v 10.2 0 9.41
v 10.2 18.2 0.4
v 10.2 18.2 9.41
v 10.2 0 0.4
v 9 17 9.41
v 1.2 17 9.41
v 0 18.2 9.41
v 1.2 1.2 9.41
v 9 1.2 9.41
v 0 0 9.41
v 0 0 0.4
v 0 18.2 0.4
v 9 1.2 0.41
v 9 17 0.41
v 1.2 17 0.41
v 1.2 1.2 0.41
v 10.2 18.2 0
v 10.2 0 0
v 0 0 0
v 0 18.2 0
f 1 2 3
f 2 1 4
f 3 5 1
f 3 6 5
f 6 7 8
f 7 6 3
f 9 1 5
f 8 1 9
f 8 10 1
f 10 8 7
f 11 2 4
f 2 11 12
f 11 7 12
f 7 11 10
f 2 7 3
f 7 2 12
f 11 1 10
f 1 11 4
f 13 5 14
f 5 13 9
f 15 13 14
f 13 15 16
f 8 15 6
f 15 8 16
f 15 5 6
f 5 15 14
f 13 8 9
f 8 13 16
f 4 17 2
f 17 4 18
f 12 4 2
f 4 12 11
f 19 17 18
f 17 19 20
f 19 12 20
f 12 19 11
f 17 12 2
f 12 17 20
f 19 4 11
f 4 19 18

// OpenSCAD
// file: ../../Base/Rotation.scad
// Fischertechnik Box Foundation
// Geometry Helpers Rotation

include <PlacementOptions.scad>

// getRotatedSpace(space, rotation=NoRotation)
// Rotates the space dependent on the specified rotation

function getRotatedSpace(space, rotation=NoRotation) = [
    (rotation == Rotate90 || rotation == Rotate270) ? space.y : space.x,
    (rotation == Rotate90 || rotation == Rotate270) ? space.x : space.y
];

// Rotates the given space around the fixed left lower corner
// space = the space the children needs as width/depth list [width,depth]
// rotation = 0 Rotate0 degrees, 1 Rotate90 degrees, 2 Rotate180 degrees, 3 Rotate270 degrees (equivalent to -90)

module RotateFix(space, rotation=NoRotation) {
    dy = (rotation == Rotate0 || rotation == Rotate270) ? 0 :
        (rotation == Rotate90) ? space.x :
        space.y;
    dx = (rotation < Rotate180) ? 0 :
        (rotation == Rotate180) ? space.x :
        space.y;
    
    translate([dx, dy, 0])
        rotate([0, 0, rotations[rotation]])
            children();
}
// file: ../../Base/Alignment.scad
// Fischertechnik Box Foundation
// Geometry Helpers Alignment

include <PlacementOptions.scad>

// getAlignedX(elementWidth, spaceWidth, align=AlignRight, offset=0)
// Gets the aligned X offset of an element with the given
// width in the given space.
// elementWidth = The width of the element to positon
// spaceWidth = The space where the element should be aligned
// align = 0 AlignLeft, 1 AlignCenter, 2 AlignRight
// offset = an optional offset from the aligned position. When
// aligned left or centered, then positive values are in X direction.
// When aligned right then positive values are in negative X direction.

function getAlignedX(elementWidth, spaceWidth, align=AlignRight, offset=0) =
    (align == AlignLeft) ?
        offset :
        ((align == AlignCenter) ?
        (spaceWidth - elementWidth)/2 + offset :
        spaceWidth - offset - elementWidth);

// getAlignedY(elementDepth, spaceDepth, align=AlignTop, offset=0)
// Gets the aligned Y offset of an element with the given
// depth in the given space.
// elementDepth = The depth of the element to positon
// spaceDepth = The space where the element should be aligned
// align = 0 AlignBottom, 1 AlignCenter, 2 AlignTop
// offset = an optional offset from the aligned position. When
// aligned bottom or centered, then positive values are in Y direction.
// When aligned top then positive values are in negative Y direction.

function getAlignedY(elementDepth, spaceDepth, align=AlignTop, offset=0) =
    (align == AlignBottom) ?
        offset :
        ((align == AlignCenter) ?
        (spaceDepth - elementDepth)/2 + offset :
        spaceDepth - offset - elementDepth);
// file: ../../Base/PlacementOptions.scad
// Fischertechnik Box Foundation
// Placement Options

// Alignment
NoAlign = 0;
AlignLeft = 1;
AlignBottom = 2;
AlignCenter = 3;
AlignRight = 4;
AlignTop = 5;

// Element rotation degree steps
rotations = [0, -90, -180, -270];

// Rotation
NoRotation = 0;
Rotate0 = 0;
Rotate90 = 1;
Rotate180 = 2;
Rotate270 = 3;

// Docking (seen from above)
NoDock = -1;
DockLeft = 0;
DockTop = 1;
DockRight = 2;
DockCorner = 2;
DockBottom = 3;

// Web corners
LowerLeft = 0;
UpperLeft = 1;
UpperRight = 2;
LowerRight = 3;

// Web position relative to corner
LeftOfCorner = 0;
RightOfCorner = 1;

// Rails direction
Horizontal = true;
Vertical = false;
// file: ../../Base/Boxes.scad
// Fischertechnik Box Foundation
// Pre-designed Boxes

use <Constants.scad>

include <PlacementOptions.scad>

box190Width = 190;
box190Depth = 130;
box130Width = 130;
box130Depth = 95;

// Values are from an original ec3 box
topBottomDifference = 1.5;
outerHeight = 40;
baseThickness = 1.8;
innerHeight = outerHeight - baseThickness;
stackExcess = 5.7;
radius = 3.5;
wallThickness = 1.5;
tolerance = 0.2;

boxWallThickness = wallThickness;
boxBaseThickness = baseThickness;
boxWebWidth = 3.0;

// getBoxWallThickness()
// Gets the wall thickness of a Fischertechnik Box
function getBoxWallThickness() = boxWallThickness;

// getBoxUsageHeight(height = 38.2)
// Gets the usable height of a Fischertechnik box
// height = Outer height of the box from the bottom to the upper edge.
function getBoxUsageHeight(height = outerHeight) = height - baseThickness - stackExcess;

// getBoxInnerHeight()
// Gets the inner height of a Fischertechnik box, including the stack excess
function getBoxInnerHeight() = innerHeight;

// getBoxBaseThickness()
// Gets the thickness of the Fischertechnik box base.
function getBoxBaseThickness() = boxBaseThickness;

// getBoxWebWidth()
// Gets the width of a box web
function getBoxWebWidth() = boxWebWidth;

// getBox190Space()
// Gets the usable inner space of a Box 190 as an x/y-list
function getBox190Space() = [
    box190Width - 2*getBoxWallThickness() - topBottomDifference, 
    box190Depth - 2*getBoxWallThickness() - topBottomDifference ];

// RoundedCornerPlate(width, depth, height, radius)
// Creates a body plate with rounded corners for a box. Used
// also to create the complete box with the hull module.
// width = Width of the plate
// depth = depth of the plate 
// height = thickness of the plate
// radius = radius of the rounded corner
module RoundedCornerPlate(width, depth, height, radius) {
    translate([radius, radius])
    hull() {
        w = width-2*radius;
        d = depth-2*radius;
        cube([w, d, height]);
        cylinder(height, r=radius, $fn=getFragments());
        translate([w, 0])
            cylinder(height, r=radius, $fn=getFragments());
        translate([w, d])
            cylinder(height, r=radius, $fn=getFragments());
        translate([0, d])
            cylinder(height, r=radius, $fn=getFragments());
    }
}

// BoxBase(width, depth)
// Creates an empty stackable Fischertechnik compatible box
// width = Outer width of the box (190, 130, ...)
// depth = Outer depth of the box (130, 95, ...)

module BoxBase(width, depth, height=outerHeight) {    
    thinPlate = 0.01;

    innerHeight = height - baseThickness;    
    
    module Body(tolerance=tolerance) {
        hull() {
            // Bottom with tolerance to fit into the original boxes when stacked
            translate([-wallThickness+tolerance, -wallThickness+tolerance, -baseThickness])
                RoundedCornerPlate(width-topBottomDifference-2*tolerance, depth-topBottomDifference-2*tolerance, thinPlate, radius);
            
            // Top
            translate([-wallThickness-topBottomDifference/2, -wallThickness-topBottomDifference/2, innerHeight-thinPlate])
                RoundedCornerPlate(width, depth, thinPlate, radius);
         }
    }

    module Cutoff() {
        hull() {
            coWidth = width - 2*wallThickness;
            coDepth = depth - 2*wallThickness;
            
            // Bottom
            RoundedCornerPlate(coWidth-topBottomDifference, coDepth-topBottomDifference, thinPlate, radius);

            // Top
            translate([-topBottomDifference/2, -topBottomDifference/2, innerHeight+thinPlate]) 
                RoundedCornerPlate(coWidth, coDepth, thinPlate, radius);
        }
    }
    
    difference() {        
        Body();
        Cutoff();
        stackOffset = innerHeight - stackExcess;
        translate([0, 0, stackOffset + baseThickness])
            Body(tolerance=0);
    }
}

// Creates the Fischertechnik empty box 130x190 mm and places it at position 0,0
// 190x130 are the outer sizes, the inner space is slightly smaller. Use getBox190Space() to get the inner sizes.
// The box is positioned that the usable inner space is at the 0,0,0 position.

module Box190() {
    BoxBase(box190Width, box190Depth);
}

// Gets the usable inner space of a Box 130 as an x/y-list
function getBox130Space() = [
    box130Width - 2*getBoxWallThickness() - topBottomDifference, 
    box130Depth - 2*getBoxWallThickness() - topBottomDifference ];

// Creates the Fischertechnik empty box 95x130 mm and places it at position 0,0
// 190x130 are the outer sizes, the inner space is slightly smaller. Use getBox190Space() to get the inner sizes.
// The box is positioned that the usable inner space is at the 0,0,0 position.

module Box130() {
    BoxBase(box130Width, box130Depth);
}

// Creates a web at the specified box walls
// corner 0 = LowerLeft, 1 = UpperLeft, 2 = UpperRight, 3 = LowerRight
// side 0 = LeftOfCorner, 1 = RightOfCorner
// distance = Distance in mm from the corner
// boxSpace = inner width and depth of the box (default: Box 190)
// webWidth = length of the web (default is 3 mms)
// webThickness = thickness of the web (default is 1 mm)
// height = Height of the web (standard is getBoxUsageHeight())
// sink = How much of the web is sunk into the wall

module BoxWeb(
    corner, 
    side, 
    distance, 
    boxSpace=getBox190Space(), 
    webWidth=getBoxWebWidth(), 
    webThickness=1.0, 
    height=getBoxUsageHeight(),
    sink = getBoxWallThickness()/2) {
    width = (corner % 2 == 0) ? 
            (side == LeftOfCorner ? webWidth : webThickness) :
            (side == LeftOfCorner ? webThickness : webWidth);

    depth = (corner % 2 == 0) ? 
            (side == RightOfCorner ? webWidth : webThickness) :
            (side == RightOfCorner ? webThickness : webWidth);
    
    xDiff = corner == LowerLeft ? 
                (side == LeftOfCorner ? -sink : distance) :
            (corner == UpperLeft ?                
                (side == LeftOfCorner ? distance : -sink) :
            (corner == UpperRight ?
                (side == LeftOfCorner ? boxSpace.x-webWidth+sink : boxSpace.x-distance-webThickness) :
                (side == LeftOfCorner ? boxSpace.x-distance-webThickness: boxSpace.x-webWidth+sink)));

    yDiff = corner == LowerLeft ? 
                (side == RightOfCorner ? -sink : distance) :
            (corner == UpperLeft ?
                (side == RightOfCorner ? boxSpace.y-distance-webThickness : boxSpace.y-webWidth+sink) :
            (corner == UpperRight ?
                (side == RightOfCorner ? boxSpace.y-webWidth+sink : boxSpace.y-distance-webThickness) :
                (side == RightOfCorner ? distance : -sink)));
    
    translate([xDiff, yDiff, -getExcess()])
        cube([width, depth, height + 2*getExcess()]);
}
// file: ../../Base/Placement.scad
// Fischertechnik Box Foundation
// Geometry Helpers Placement

use <Constants.scad>
use <Alignment.scad>
use <Rotation.scad>
use <Boxes.scad>

include <PlacementOptions.scad>

// Place(x=0, y=0, elementSpace=[0,0], alignX=AlignLeft, alignY=AlignBottom, rotation=Rotate0, boxSpace=getBox190Space())
// Places the child at the specified position
// y = Y-Position. This is a relative position when an X aligment is specified.
// x = X-Position. This is a relative position when an Y aligment is specified.
// elementSpace = space of the element to be placed [x,y]
// alignX = -1=NoAlign, 0 AlignLeft, 1 AlignCenter, 3 AlignRight (elementSpace and boxSpace required!)
// alignY = -1=NoAlign, 2 AlignBottom, 1 AlignCenter, 4 AlignTop (elementSpace and boxSpace required!)
// rotation = 0 Rotate0 0 degrees, 1 Rotate90 90 degrees, 
// 2 Rotate180 180 degrees, 3 Rotate270 270 degrees (equivalent to -90)
// boxSpace = Inner space of the box where the placement occurs [x,y] - default is Box 190x130 inner space

module Place(x=0, y=0, elementSpace=[0,0], 
  alignX=AlignLeft, alignY=AlignBottom, 
  rotation=NoRotation, boxSpace=getBox190Space()) {

    module Position(x, y, space, rotation=Rotate0) {
        translate([x, y, 0])
            RotateFix(space, rotation)
                children();
    }

    space = getRotatedSpace(elementSpace, rotation);
    alignedX = getAlignedX(space.x, boxSpace.x, alignX, x);
    alignedY = getAlignedY(space.y, boxSpace.y, alignY, y);
    Position(alignedX, alignedY, elementSpace, rotation)
        children();
}

// Center(space=getBox130Space(), elementSpace=[0,0])
// space = Space where the children is centered. For cylinder use centered=true and no elementSpace.
// elementSpace = space of the element to be centered [x,y]

module Center(space=getBox190Space(), elementSpace=[0,0]) {
    Place(elementSpace=elementSpace, boxSpace=space, alignX=AlignCenter, alignY=AlignCenter)
        children();
}

// CenterHorizontal(width=0, y=0, offset=0, space=getBox130Space())
// width = Width of the element to be placed.
// y = Y position of the element
// offset = Offset from the center position (negative will be left of the center)
// space = Space where the element is placed

module CenterHorizontal(width=0, y=0, offset=0, space=getBox190Space()) {
    Place(x=offset, y=y, elementSpace=[width, 0], boxSpace=space, alignX=AlignCenter)
        children(0);
}

// CenterVertical(depth=0, x=0, offset=0, space=getBox130Space())
// depth = Depth of the element to be placed.
// x = X position of the element
// offset = Offset from the center position (negative will be down of the center)
// space = Space where the element is placed

module CenterVertical(depth=0, x=0, offset=0, space=getBox190Space()) {
    Place(x=x, y=offset, elementSpace=[0, depth], boxSpace=space, alignY=AlignCenter)
        children(0);
}

// getIsVertical(align)
// True if the specified alignment needs a vertical orientation for a divider (AlignRight, AlignLeft)

function getIsVertical(align) = (align == AlignRight || align == AlignLeft);

// getIsHorizontal(align)
// True if the specified alignment needs a horizontal orientation for a divider (AlignTop, AlignBottom)

function getIsHorizontal(align) = (align == AlignTop || align == AlignBottom);
// file: ../../Elements/AxisClip10.scad
// Fischertechnik Box Library
// Axis for clip 10
// 31023

use <../ModelBase/Simple.scad>
use <../Base/Constants.scad>

/* [Element Parameters] */
height = 23;
clipHeight = 10;

/* [Hidden] */
width = 12;
depth = 12;
upperDiameter = 3.6;

// getAxisClip10Space()
// Gets the space of a n axis for a clip 10 with spring ring (mot2)

function getAxisClip10Space() = [width, depth, height];

// AxisClip10(height, clipHeight)
// Axis for clip 10 with spring ring (mot2)
// height = Height of the complete axis (standard is 23, in mot3 its only 12)
// clipHeight = Height of the part for the clip (standard is 10, in mot3 its only 7)

module AxisClip10(height=height, clipHeight=clipHeight) {
    LeveledAxisWithSpace(height, height-clipHeight, getAxisClip10Space(), diameter=upperDiameter);
}

// Test
color("lightgray")
AxisClip10(height, clipHeight);
// file: ../../Base/Constants.scad
// Fischertechnik Box Foundation
// Constants

// Constant values necessary for multiple elements

// Base constants
dividerThickness = 1.2;
excess = 0.01;
fragments = 90;
tolerance = 0.8;

// Gets the thickness of a divider 
function getDividerThickness() = dividerThickness;

// Gets the excess that is used to merge walls into each other
function getExcess() = excess;

// Gets amount of fragments of a cylinder
function getFragments() = fragments;

// Gets the inner tolerance of a frame to each side
function getTolerance() = tolerance;


// Fischertechnik specific constants
axisDiameter = 4;
axisBottomDiameter = axisDiameter + 1;
axisTolerance = 0.2;
axisLockingLength = 8;

// Gets axis diameter of Fischertechnik axis
function getAxisDiameter() = axisDiameter;

// Gets axis diameter tolerance (subtracted for element axis)
function getAxisTolerance() = axisTolerance;

// Gets the axis diameter for standing axis
function getStandAxisDiameter() = getAxisDiameter() - getAxisTolerance();

// Gets axis bottom diameter for thicker part at the bottom
function getAxisBottomDiameter() = axisBottomDiameter;

// Gets the lengthh of the locking part of a locking axis
function getAxisLockingLength() = axisLockingLength;

pinHeight = 2.5;
pinTolerance = 0.2;

// gets the height of a connecting pin
function getPinHeight() = pinHeight;

// gets the connecting pin height tolerance
function getPinTolerance() = pinTolerance;

standardEdgeDistance = 2.5;
standardWebDistance = 11.5;
standardCornerLength = 15;

// gets the standard distance to the wall of the box for dockable frames with webs
function getStandardEdgeDistance() = standardEdgeDistance;

// gets the standard distance of each web to the corner of the dockable frame
function getStandardWebDistance() = standardWebDistance;

// gets the standard length of the corner walls of a dockable frame
function getStandardCornerLength() = standardCornerLength;

tubeWallFactor = 0.8;

// gets the wall thickness of a tube.
function getTubeWallThickness() = tubeWallFactor * getDividerThickness();

smallPartsFrameHeight = 20;

// gets the frame height for docked small parts boxes.
function getSmallPartsFrameHeight() = smallPartsFrameHeight;

hubRingDiameter = 19.5;
hubRingLevelDiameter = 21;

// gets the diameter of a tube matching the inner ring of a wheel
function getHubRingDiameter() = hubRingDiameter;

// gets the diameter of a hub tube with a thicker diameter
function getHubRingLevelDiameter() = hubRingLevelDiameter;
// file: ../../Elements/FrameAngle7p5.scad
// Fischertechnik Box Library
// Frame for 7.5 degrees angle blocks
// 32071

use <../Base/Constants.scad>
use <../ModelBase/Simple.scad>

/* [Element Parameters] */
count = 1;

/* [Hidden] */
width = 7;
depth = 15;
height = 9;

// getFrameAngle7p5Space
// Gets the space the frame for 7.5 degrees angle blocks needs for count blocks
// count = Count of angle blocks

function getFrameAngle7p5Space(count=1) = getFrameOuterVolume([width * count, depth, height]);

// FrameAngle7p5(count)
// count = Count of angle blocks in x direction
// The walls of the frame are 9 mm high.

module FrameAngle7p5(count=1) {
    Frame([width * count, depth, height]);
}

// Tests
color ("lightgray")
FrameAngle7p5(count);
// file: ../TestPrint.scad
// 3D Print Test Base

use <../Base/Constants.scad>

use <../Elements/AxisClip10.scad>

module TestPrint(elementSpace) {
    cube([elementSpace.x, elementSpace.y, 0.4]);
    translate([0,0,0.4+getExcess()]) {
        children();
    }
}

TestPrint(getAxisClip10Space())
    AxisClip10();
// main file
// 3D Print Test
// FrameAngle7p5

use <../TestPrint.scad>
use <../../Elements/FrameAngle7p5.scad>

count=1;

TestPrint(getFrameAngle7p5Space(count))
    FrameAngle7p5(count);
